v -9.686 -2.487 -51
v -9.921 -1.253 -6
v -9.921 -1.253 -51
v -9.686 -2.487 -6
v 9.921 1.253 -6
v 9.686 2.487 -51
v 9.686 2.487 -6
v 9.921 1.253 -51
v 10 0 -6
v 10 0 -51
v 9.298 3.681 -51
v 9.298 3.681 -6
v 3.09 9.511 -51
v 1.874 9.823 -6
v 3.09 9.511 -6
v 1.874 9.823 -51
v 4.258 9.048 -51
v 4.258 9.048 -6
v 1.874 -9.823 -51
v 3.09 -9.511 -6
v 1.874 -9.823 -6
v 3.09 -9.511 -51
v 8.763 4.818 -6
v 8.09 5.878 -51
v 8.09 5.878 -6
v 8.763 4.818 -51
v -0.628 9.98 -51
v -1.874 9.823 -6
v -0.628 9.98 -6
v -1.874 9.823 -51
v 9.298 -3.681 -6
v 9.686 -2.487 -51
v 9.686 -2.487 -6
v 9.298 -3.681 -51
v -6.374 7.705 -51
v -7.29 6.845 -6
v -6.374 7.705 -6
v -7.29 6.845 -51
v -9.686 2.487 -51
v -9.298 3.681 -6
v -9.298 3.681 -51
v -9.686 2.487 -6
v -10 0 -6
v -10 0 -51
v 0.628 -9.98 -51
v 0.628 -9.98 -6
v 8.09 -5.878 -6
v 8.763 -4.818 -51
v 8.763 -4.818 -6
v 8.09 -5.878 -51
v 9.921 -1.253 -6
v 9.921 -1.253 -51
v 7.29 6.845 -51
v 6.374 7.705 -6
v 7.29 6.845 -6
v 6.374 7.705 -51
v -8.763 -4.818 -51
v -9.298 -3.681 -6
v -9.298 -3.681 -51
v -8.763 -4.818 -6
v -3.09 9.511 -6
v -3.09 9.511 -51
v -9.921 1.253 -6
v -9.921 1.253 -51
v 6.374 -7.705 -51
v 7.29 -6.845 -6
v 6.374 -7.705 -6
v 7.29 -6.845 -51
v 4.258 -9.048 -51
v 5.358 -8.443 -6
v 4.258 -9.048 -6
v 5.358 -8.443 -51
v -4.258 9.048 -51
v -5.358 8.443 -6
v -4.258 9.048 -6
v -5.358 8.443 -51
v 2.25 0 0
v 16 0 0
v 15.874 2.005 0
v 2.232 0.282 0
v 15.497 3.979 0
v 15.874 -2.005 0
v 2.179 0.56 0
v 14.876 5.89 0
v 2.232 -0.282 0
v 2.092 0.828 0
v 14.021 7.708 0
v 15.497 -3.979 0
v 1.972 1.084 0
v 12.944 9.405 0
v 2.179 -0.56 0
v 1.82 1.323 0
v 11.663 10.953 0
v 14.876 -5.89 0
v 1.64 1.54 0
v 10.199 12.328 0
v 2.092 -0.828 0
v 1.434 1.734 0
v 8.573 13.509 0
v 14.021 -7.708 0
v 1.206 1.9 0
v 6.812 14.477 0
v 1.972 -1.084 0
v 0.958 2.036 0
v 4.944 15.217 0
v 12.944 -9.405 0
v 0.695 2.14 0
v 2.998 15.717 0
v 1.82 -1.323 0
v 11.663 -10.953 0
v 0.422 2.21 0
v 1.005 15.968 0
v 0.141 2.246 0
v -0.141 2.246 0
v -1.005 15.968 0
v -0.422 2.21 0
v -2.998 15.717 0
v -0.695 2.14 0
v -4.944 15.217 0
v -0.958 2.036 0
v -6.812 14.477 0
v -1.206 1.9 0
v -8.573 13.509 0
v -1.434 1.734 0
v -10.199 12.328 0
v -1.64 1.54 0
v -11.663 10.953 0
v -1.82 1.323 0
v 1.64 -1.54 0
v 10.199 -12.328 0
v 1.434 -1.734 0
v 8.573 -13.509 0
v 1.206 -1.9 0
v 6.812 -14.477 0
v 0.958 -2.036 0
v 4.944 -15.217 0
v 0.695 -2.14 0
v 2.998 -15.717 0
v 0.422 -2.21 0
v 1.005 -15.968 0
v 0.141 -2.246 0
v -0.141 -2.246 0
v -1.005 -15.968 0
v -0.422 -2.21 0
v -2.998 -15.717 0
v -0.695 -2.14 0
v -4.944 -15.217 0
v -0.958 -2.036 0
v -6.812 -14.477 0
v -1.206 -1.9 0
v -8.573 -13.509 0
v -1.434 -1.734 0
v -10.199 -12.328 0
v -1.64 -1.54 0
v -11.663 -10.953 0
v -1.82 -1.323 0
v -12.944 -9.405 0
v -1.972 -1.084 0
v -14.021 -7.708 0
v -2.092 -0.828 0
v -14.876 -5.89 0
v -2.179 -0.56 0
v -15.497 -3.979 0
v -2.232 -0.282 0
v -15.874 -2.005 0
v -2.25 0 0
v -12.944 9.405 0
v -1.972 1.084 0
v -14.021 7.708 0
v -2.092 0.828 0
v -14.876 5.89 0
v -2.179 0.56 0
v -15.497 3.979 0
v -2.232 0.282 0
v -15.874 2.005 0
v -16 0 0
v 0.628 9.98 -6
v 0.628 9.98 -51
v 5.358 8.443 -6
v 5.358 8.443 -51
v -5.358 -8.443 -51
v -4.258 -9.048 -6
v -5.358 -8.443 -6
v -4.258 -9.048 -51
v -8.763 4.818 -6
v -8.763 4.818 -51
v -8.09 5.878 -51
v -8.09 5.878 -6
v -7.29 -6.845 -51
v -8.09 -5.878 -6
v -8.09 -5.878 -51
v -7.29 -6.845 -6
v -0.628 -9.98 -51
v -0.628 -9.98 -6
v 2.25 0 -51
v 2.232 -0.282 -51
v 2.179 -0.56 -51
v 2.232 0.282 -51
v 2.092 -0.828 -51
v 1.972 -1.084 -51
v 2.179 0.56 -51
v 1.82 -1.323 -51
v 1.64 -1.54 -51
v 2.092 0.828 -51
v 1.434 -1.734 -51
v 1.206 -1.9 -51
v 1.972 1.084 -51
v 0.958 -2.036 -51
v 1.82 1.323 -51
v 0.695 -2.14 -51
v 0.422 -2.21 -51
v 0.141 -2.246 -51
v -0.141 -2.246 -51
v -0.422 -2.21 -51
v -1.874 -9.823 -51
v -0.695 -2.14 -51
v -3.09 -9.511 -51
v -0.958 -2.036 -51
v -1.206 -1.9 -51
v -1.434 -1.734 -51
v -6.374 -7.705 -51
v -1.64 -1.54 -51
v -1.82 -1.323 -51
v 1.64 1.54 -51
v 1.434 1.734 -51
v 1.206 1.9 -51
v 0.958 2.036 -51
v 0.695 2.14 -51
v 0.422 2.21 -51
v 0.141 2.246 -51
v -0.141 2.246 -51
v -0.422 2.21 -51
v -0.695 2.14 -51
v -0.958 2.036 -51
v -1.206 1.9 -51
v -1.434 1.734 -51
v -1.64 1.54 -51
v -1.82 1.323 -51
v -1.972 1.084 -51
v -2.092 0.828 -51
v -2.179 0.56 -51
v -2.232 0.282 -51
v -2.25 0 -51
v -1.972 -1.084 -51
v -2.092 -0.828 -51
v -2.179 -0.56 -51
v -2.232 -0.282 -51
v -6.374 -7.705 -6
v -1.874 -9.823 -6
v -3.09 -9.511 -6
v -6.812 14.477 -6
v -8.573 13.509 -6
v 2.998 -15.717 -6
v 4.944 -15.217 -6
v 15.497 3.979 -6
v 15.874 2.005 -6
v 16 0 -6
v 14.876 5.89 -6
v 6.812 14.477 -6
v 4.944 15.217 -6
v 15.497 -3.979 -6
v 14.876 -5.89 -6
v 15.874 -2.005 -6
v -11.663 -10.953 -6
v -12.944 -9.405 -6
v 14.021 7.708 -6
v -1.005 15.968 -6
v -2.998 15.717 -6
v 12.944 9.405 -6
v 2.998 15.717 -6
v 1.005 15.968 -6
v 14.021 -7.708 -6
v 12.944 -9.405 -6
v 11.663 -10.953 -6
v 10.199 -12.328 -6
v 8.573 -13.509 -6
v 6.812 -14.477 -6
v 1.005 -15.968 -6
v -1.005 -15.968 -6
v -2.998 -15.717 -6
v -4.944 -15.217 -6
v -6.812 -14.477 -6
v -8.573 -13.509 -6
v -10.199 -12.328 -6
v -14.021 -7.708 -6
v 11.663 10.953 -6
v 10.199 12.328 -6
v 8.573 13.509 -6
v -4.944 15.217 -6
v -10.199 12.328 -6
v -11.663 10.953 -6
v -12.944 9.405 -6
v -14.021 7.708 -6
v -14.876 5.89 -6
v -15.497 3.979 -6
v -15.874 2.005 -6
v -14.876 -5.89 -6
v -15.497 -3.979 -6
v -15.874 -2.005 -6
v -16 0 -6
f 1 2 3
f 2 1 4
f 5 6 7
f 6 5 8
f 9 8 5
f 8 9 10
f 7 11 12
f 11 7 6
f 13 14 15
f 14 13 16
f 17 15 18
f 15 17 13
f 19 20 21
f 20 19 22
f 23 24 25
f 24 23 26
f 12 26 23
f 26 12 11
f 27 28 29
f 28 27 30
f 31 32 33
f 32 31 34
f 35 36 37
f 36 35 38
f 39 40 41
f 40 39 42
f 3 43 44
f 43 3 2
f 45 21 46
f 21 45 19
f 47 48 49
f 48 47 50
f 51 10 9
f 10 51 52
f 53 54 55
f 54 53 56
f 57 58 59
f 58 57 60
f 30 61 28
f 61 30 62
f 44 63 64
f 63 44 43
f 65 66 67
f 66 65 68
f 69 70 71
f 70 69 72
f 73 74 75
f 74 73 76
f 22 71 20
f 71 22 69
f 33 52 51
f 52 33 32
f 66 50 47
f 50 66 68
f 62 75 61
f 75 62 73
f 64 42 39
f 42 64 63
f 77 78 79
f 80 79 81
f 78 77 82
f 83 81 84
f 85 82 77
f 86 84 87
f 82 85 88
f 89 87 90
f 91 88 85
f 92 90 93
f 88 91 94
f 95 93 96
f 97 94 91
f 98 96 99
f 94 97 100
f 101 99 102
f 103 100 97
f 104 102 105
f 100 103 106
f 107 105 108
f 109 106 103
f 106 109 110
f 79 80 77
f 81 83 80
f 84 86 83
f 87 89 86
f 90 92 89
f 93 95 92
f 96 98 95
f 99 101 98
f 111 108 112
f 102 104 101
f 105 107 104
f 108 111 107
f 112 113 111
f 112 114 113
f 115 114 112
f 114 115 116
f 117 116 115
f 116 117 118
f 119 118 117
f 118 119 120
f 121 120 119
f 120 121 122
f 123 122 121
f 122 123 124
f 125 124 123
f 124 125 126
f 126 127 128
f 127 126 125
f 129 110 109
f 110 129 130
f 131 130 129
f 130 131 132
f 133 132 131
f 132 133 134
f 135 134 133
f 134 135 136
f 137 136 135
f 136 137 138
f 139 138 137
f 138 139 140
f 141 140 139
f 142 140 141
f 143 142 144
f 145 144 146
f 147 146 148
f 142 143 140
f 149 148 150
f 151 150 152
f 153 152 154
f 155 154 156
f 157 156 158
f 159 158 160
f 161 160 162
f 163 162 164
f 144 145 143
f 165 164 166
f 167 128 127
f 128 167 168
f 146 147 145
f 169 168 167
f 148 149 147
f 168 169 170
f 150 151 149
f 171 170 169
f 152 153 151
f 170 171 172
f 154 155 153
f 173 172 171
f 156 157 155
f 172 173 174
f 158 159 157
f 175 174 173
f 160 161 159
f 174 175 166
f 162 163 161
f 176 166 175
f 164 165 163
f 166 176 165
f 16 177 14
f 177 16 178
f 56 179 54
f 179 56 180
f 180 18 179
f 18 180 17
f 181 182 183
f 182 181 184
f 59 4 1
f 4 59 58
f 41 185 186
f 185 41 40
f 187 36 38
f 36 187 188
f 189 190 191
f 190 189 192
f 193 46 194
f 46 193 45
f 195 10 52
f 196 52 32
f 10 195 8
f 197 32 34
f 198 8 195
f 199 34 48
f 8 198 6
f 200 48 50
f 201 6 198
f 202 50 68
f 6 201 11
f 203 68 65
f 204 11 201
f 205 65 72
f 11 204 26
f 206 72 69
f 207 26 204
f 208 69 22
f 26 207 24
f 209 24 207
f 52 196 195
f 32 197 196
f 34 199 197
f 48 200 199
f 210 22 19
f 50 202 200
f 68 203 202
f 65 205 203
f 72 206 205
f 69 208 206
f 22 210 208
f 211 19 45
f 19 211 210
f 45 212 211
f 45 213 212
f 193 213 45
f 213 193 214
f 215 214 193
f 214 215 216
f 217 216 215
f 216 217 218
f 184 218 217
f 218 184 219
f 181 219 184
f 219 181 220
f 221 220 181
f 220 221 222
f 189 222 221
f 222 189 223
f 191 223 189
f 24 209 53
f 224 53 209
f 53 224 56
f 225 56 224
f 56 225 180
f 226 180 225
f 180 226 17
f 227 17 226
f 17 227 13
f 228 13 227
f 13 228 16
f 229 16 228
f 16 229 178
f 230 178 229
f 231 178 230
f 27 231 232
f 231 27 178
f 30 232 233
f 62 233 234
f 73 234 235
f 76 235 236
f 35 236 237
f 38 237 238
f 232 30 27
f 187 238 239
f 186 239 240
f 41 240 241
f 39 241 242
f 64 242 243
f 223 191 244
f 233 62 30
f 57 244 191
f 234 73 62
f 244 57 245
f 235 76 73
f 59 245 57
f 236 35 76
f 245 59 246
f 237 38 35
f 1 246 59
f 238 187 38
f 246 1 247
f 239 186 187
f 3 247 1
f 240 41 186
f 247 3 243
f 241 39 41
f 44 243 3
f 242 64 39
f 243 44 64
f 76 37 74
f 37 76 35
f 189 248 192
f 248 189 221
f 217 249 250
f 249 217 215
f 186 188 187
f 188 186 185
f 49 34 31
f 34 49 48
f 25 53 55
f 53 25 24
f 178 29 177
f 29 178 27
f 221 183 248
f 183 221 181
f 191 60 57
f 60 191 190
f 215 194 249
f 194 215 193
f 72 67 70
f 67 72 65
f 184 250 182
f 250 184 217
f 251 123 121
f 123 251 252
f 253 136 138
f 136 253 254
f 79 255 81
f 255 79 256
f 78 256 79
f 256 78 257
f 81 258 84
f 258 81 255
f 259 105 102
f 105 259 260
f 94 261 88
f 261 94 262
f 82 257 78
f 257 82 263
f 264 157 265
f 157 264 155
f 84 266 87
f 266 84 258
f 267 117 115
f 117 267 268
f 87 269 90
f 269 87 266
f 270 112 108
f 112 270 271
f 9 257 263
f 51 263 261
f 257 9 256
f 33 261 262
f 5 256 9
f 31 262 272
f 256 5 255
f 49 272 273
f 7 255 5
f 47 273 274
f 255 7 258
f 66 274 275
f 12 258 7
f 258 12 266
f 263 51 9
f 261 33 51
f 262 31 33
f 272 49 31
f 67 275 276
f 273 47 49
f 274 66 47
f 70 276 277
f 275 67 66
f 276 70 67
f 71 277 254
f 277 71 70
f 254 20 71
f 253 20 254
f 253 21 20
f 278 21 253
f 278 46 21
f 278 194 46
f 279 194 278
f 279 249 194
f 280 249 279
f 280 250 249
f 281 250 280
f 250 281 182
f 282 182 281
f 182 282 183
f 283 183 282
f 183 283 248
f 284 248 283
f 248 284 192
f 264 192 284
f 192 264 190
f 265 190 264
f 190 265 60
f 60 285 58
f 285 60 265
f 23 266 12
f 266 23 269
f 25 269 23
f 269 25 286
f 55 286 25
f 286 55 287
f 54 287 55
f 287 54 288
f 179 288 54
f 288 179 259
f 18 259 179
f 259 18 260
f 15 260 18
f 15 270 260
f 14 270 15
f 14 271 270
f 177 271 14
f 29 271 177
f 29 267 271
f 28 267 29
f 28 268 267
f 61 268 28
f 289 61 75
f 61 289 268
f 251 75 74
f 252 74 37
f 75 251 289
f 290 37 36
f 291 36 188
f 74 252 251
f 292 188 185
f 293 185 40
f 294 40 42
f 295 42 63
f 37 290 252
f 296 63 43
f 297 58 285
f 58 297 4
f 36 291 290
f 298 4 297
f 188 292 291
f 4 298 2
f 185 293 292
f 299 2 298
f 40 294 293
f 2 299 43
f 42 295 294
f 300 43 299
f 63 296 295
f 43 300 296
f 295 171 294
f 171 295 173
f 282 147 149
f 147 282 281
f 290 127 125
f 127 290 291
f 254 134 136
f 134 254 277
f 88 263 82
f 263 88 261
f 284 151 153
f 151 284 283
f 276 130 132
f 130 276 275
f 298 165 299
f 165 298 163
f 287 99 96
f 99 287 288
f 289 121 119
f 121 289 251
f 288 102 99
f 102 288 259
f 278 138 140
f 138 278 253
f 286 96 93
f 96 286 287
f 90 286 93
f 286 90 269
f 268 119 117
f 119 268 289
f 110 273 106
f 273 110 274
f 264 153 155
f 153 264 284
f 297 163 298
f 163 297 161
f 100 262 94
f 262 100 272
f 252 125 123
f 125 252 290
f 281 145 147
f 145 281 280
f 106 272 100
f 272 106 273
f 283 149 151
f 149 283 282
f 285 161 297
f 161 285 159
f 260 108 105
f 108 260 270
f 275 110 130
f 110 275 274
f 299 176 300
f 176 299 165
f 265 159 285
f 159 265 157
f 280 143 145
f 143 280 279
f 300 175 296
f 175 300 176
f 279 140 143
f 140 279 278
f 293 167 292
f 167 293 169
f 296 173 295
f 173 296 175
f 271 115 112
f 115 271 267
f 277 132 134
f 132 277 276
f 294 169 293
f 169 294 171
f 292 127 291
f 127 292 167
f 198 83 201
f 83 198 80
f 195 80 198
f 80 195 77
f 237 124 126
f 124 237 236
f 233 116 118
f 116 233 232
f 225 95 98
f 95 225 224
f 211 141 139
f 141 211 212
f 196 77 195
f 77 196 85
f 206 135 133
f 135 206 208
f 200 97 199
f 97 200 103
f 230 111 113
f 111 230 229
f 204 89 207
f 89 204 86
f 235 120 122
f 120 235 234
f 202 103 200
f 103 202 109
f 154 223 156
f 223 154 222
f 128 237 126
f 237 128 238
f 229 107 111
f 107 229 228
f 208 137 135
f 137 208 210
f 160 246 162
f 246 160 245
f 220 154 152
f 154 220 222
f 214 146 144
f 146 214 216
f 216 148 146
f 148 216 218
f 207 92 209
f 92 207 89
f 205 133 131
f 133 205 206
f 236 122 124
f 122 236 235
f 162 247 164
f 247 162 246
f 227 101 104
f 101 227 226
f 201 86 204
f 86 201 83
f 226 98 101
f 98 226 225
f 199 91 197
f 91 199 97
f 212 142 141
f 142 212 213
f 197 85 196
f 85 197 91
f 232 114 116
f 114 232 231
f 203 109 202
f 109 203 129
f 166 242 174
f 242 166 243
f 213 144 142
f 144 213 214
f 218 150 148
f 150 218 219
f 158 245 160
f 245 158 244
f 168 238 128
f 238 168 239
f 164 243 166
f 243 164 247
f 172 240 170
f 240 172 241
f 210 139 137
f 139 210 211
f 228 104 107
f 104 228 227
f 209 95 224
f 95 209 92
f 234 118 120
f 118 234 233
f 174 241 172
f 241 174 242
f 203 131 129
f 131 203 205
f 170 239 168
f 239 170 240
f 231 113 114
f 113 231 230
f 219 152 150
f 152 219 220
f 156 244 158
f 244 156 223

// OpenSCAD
$fn = 50;


difference() {
	union() {
		translate(v = [0, 0, -51.0000000000]) {
			cylinder(h = 51, r = 10.0000000000);
		}
		translate(v = [0, 0, -6.0000000000]) {
			cylinder(h = 6, r = 16.0000000000);
		}
	}
	union() {
		#translate(v = [0, 0, -51]) {
			cylinder(h = 51, r = 2.2500000000);
		}
	}
}
